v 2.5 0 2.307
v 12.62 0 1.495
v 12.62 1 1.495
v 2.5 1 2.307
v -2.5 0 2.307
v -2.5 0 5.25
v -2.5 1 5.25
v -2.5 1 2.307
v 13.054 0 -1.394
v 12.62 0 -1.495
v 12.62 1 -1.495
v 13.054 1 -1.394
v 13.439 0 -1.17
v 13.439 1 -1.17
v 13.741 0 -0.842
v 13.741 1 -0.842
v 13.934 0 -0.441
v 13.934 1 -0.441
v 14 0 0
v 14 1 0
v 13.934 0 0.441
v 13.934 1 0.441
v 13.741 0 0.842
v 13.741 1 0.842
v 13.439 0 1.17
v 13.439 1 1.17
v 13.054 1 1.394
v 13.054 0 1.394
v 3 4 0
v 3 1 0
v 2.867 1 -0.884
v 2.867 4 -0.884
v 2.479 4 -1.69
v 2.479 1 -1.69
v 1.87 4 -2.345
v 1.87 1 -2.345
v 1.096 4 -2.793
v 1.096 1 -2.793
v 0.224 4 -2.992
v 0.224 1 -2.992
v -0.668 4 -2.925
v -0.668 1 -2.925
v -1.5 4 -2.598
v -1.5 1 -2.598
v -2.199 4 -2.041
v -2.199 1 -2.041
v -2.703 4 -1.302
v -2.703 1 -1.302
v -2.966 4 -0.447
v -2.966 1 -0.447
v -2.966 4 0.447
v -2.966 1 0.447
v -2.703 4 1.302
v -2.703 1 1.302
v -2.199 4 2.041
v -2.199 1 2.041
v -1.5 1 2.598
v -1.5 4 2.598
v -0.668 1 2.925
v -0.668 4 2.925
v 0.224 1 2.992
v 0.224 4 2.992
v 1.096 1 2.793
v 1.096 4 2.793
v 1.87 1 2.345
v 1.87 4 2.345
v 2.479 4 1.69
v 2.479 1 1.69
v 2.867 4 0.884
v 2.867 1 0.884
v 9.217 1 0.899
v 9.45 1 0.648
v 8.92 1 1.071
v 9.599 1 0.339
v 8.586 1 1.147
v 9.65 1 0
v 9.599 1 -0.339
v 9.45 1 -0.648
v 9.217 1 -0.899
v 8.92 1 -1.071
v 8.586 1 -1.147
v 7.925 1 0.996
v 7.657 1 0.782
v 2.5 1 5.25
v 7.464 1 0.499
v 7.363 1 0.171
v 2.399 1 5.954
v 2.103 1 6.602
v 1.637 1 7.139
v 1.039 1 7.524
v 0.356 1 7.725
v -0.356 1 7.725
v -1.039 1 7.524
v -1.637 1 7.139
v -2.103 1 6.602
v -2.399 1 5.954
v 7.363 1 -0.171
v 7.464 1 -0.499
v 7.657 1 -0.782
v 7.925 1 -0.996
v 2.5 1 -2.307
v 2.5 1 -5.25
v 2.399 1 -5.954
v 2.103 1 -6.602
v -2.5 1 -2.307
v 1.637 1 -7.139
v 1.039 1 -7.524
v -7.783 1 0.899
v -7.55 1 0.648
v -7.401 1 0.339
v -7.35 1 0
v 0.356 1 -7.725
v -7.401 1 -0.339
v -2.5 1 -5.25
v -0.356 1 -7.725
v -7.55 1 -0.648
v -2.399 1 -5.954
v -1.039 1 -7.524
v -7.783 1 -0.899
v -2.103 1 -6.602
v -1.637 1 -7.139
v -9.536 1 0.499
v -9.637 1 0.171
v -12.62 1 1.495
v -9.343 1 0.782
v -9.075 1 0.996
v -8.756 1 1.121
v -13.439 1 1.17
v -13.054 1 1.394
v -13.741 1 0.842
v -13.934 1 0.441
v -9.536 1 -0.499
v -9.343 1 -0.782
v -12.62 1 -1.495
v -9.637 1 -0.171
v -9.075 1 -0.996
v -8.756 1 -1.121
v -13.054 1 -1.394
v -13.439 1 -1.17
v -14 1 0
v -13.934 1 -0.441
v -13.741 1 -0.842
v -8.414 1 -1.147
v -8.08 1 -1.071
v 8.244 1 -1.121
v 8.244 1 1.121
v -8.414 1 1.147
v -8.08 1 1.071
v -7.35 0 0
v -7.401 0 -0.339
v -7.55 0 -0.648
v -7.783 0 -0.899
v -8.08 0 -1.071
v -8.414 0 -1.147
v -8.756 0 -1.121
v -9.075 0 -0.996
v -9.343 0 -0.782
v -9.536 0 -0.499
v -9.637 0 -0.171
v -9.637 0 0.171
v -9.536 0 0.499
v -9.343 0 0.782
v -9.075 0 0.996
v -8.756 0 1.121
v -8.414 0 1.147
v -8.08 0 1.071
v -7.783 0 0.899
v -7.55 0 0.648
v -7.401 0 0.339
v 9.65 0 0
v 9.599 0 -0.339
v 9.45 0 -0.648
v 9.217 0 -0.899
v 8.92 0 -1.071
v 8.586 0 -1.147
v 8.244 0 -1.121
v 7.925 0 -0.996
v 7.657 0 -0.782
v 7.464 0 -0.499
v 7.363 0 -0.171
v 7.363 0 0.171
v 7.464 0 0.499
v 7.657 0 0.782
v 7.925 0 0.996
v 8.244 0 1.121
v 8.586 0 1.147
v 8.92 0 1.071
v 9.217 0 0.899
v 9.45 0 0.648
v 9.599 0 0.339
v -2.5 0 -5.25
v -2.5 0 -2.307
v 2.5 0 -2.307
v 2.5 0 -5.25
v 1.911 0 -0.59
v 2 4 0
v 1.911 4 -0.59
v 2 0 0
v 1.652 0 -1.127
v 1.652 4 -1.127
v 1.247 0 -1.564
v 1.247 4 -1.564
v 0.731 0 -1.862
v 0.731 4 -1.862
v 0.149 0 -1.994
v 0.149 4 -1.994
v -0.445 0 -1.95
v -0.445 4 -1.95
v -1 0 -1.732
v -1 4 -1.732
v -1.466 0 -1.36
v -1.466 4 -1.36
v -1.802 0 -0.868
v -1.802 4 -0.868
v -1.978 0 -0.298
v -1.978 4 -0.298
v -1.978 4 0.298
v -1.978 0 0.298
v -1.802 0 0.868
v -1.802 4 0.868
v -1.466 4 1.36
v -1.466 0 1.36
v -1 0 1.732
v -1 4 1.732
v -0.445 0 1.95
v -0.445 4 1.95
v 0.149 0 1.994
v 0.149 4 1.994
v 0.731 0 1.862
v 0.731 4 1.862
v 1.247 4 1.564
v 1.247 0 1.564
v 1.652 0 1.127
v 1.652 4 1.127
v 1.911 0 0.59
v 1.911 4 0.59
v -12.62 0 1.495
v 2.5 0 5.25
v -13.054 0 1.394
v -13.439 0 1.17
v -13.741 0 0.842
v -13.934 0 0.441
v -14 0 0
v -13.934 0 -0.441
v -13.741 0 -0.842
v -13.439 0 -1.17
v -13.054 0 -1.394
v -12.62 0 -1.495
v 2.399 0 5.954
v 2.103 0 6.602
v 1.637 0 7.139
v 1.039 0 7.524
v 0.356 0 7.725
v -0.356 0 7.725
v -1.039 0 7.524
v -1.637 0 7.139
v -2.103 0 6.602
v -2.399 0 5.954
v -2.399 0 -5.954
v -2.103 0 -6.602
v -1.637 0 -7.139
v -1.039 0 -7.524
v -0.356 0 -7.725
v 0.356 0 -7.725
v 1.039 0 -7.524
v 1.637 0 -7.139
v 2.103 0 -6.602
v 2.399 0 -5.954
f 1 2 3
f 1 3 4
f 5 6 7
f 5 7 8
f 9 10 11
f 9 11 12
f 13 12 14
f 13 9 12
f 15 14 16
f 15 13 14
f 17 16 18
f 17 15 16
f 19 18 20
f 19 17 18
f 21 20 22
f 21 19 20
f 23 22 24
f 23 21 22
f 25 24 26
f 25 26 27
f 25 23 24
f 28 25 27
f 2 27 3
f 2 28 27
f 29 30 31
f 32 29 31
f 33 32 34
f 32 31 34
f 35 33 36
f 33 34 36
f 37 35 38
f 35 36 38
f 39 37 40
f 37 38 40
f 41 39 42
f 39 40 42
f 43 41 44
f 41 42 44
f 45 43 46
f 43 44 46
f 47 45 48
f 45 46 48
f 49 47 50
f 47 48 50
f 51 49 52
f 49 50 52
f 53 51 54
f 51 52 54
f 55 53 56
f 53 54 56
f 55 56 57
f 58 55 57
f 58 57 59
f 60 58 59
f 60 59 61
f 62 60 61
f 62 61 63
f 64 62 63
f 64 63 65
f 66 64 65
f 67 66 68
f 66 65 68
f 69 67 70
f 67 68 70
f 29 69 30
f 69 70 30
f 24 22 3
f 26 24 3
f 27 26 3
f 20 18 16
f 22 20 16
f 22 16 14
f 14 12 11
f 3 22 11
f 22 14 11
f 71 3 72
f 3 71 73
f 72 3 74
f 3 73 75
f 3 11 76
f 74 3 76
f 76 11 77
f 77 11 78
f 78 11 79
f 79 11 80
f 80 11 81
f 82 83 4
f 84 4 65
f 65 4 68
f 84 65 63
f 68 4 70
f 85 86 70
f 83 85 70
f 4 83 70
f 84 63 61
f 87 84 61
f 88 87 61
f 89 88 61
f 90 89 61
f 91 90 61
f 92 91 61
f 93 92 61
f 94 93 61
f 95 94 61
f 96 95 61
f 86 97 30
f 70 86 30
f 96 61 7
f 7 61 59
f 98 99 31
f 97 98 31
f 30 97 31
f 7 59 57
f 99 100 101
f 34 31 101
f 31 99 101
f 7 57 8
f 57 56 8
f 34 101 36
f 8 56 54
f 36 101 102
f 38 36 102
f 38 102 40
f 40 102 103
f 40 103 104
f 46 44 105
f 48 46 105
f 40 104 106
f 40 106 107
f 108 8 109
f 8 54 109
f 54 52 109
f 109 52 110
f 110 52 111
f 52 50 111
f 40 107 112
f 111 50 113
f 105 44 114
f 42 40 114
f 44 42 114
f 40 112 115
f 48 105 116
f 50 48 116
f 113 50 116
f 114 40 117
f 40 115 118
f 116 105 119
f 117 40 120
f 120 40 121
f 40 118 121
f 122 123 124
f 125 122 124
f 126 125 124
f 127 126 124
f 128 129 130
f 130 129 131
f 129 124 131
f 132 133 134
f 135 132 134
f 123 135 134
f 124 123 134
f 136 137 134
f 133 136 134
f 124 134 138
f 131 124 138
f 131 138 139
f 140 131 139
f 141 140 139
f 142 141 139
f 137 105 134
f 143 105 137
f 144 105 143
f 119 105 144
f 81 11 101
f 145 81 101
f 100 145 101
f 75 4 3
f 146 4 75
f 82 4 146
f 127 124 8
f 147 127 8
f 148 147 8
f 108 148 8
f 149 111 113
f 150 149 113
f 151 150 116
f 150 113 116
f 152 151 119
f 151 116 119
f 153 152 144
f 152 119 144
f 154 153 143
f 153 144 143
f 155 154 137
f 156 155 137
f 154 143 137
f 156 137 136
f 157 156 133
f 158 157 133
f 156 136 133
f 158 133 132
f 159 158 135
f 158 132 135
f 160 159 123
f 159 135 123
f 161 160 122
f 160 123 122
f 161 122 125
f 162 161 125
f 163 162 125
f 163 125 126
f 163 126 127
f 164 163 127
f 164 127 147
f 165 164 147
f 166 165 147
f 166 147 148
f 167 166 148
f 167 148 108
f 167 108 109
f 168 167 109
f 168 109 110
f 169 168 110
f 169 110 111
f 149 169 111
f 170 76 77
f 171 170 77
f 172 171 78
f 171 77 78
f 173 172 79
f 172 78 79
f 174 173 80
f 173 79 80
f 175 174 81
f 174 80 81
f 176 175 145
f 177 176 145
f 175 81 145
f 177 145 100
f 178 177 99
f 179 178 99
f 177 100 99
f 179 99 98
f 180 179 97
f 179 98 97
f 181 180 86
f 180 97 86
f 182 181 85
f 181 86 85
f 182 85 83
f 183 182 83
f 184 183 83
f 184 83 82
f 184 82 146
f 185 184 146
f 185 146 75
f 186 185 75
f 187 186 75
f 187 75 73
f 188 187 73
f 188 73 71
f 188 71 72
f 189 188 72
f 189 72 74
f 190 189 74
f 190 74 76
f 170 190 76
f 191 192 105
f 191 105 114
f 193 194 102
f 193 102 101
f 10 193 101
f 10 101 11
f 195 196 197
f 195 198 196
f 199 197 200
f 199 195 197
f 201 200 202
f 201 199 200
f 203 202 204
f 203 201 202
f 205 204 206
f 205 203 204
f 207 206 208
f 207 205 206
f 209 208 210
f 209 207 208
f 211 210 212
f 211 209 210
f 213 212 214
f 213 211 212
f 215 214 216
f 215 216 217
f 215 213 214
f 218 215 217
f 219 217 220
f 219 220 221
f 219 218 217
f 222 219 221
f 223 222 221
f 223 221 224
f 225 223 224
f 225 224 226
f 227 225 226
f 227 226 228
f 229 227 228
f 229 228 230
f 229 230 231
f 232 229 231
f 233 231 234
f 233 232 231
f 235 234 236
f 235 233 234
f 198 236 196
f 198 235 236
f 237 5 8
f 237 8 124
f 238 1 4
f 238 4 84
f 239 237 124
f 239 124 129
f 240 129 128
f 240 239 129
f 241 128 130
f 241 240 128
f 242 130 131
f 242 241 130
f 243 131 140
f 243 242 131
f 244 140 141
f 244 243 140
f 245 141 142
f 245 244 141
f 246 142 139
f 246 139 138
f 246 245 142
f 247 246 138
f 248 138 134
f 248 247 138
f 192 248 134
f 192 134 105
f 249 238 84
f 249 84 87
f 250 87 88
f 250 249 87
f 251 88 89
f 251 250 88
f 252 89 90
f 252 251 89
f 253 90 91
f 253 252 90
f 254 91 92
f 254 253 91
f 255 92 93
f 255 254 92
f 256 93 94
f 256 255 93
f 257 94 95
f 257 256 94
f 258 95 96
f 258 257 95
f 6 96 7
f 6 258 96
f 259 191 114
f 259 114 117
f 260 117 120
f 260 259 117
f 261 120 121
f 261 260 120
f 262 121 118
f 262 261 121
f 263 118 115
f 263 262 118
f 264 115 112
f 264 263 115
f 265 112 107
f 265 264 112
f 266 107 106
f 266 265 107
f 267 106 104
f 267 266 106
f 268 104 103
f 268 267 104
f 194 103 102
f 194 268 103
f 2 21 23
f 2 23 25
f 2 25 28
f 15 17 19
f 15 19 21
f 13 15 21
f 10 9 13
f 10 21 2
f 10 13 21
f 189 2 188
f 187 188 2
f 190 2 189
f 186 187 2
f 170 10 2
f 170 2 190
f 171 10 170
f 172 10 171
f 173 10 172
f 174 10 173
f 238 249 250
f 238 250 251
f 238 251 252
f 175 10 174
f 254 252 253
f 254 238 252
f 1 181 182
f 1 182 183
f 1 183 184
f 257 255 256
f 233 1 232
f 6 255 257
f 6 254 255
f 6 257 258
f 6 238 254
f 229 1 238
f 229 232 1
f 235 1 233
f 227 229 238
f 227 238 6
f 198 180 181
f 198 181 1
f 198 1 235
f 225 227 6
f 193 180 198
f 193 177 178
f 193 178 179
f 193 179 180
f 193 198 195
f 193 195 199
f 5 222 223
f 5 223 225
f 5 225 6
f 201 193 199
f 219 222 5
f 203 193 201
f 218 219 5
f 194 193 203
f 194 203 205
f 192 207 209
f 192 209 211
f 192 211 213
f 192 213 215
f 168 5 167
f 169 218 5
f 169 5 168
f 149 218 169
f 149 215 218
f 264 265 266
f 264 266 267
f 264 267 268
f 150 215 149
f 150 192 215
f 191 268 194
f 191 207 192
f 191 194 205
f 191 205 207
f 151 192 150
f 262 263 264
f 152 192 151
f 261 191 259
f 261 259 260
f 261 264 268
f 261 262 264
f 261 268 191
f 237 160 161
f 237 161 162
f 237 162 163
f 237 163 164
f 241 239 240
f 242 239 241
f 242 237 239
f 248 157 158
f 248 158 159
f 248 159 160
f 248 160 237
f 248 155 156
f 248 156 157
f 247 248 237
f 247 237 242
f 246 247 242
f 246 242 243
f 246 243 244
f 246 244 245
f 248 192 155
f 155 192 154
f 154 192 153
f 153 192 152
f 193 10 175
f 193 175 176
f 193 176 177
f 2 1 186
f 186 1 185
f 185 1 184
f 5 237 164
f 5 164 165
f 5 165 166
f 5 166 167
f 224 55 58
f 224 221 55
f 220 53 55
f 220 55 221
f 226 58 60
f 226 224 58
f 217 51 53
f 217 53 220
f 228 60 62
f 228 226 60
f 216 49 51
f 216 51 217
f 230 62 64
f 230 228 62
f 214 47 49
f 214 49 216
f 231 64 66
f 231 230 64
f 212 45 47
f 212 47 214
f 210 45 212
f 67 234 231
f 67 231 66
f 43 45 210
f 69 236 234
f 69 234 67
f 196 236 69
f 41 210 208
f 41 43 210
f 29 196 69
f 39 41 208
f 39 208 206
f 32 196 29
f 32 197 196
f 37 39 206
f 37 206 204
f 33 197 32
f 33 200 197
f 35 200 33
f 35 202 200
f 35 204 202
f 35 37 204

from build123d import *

# Parameters (mm, degrees)
SKICA1_R                 = 2
P_IDAT_VYSUNUT_M1_DEPTH  = 1
SKICA2_R                 = 1.15
ODEBRAT_VYSUNUT_M1_DEPTH = 2
SKICA3_R                 = 3
SKICA3_R_2               = 2
P_IDAT_VYSUNUT_M2_DEPTH  = 3


with BuildPart() as part:
    # Skica1 → Přidat vysunutím1 (new body)
    with BuildSketch(Plane(origin=(0, 0, 0), x_dir=(1, 0, 0), z_dir=(0, 1, 0))):
        with BuildLine():
            Line((-12.62, 1.495192295), (-2.5, 2.307395517))
            Line((-2.5, 2.307395517), (-2.5, 5.25))
            ThreePointArc((-2.5, 5.25), (0, 7.75), (2.5, 5.25))
            Line((2.5, 5.25), (2.5, 2.307395517))
            Line((2.5, 2.307395517), (12.62, 1.495192295))
            ThreePointArc((12.62, 1.495192295), (14, 0), (12.62, -1.495192295))
            Line((12.62, -1.495192295), (2.5, -2.307395517))
            Line((2.5, -2.307395517), (2.5, -5.25))
            ThreePointArc((2.5, -5.25), (0, -7.75), (-2.5, -5.25))
            Line((-2.5, -5.25), (-2.5, -2.307395517))
            Line((-2.5, -2.307395517), (-12.62, -1.495192295))
            ThreePointArc((-12.62, -1.495192295), (-14, 0), (-12.62, 1.495192295))
        make_face()
        Circle(SKICA1_R, mode=Mode.SUBTRACT)
    extrude(amount=P_IDAT_VYSUNUT_M1_DEPTH)

    # Skica2 → Odebrat vysunutím1 (cut)
    with BuildSketch(Plane(origin=(0, 1, 0), x_dir=(1, 0, 0), z_dir=(0, 1, 0))):
        with Locations((-8.5, 0)):
            Circle(SKICA2_R)
        with Locations((8.5, 0)):
            Circle(SKICA2_R)
    extrude(amount=-ODEBRAT_VYSUNUT_M1_DEPTH, mode=Mode.SUBTRACT)

    # Skica3 → Přidat vysunutím2 (add)
    with BuildSketch(Plane(origin=(0, 1, 0), x_dir=(1, 0, 0), z_dir=(0, 1, 0))):
        Circle(SKICA3_R)
        Circle(SKICA3_R_2, mode=Mode.SUBTRACT)
    extrude(amount=P_IDAT_VYSUNUT_M2_DEPTH)


solid = part.part
